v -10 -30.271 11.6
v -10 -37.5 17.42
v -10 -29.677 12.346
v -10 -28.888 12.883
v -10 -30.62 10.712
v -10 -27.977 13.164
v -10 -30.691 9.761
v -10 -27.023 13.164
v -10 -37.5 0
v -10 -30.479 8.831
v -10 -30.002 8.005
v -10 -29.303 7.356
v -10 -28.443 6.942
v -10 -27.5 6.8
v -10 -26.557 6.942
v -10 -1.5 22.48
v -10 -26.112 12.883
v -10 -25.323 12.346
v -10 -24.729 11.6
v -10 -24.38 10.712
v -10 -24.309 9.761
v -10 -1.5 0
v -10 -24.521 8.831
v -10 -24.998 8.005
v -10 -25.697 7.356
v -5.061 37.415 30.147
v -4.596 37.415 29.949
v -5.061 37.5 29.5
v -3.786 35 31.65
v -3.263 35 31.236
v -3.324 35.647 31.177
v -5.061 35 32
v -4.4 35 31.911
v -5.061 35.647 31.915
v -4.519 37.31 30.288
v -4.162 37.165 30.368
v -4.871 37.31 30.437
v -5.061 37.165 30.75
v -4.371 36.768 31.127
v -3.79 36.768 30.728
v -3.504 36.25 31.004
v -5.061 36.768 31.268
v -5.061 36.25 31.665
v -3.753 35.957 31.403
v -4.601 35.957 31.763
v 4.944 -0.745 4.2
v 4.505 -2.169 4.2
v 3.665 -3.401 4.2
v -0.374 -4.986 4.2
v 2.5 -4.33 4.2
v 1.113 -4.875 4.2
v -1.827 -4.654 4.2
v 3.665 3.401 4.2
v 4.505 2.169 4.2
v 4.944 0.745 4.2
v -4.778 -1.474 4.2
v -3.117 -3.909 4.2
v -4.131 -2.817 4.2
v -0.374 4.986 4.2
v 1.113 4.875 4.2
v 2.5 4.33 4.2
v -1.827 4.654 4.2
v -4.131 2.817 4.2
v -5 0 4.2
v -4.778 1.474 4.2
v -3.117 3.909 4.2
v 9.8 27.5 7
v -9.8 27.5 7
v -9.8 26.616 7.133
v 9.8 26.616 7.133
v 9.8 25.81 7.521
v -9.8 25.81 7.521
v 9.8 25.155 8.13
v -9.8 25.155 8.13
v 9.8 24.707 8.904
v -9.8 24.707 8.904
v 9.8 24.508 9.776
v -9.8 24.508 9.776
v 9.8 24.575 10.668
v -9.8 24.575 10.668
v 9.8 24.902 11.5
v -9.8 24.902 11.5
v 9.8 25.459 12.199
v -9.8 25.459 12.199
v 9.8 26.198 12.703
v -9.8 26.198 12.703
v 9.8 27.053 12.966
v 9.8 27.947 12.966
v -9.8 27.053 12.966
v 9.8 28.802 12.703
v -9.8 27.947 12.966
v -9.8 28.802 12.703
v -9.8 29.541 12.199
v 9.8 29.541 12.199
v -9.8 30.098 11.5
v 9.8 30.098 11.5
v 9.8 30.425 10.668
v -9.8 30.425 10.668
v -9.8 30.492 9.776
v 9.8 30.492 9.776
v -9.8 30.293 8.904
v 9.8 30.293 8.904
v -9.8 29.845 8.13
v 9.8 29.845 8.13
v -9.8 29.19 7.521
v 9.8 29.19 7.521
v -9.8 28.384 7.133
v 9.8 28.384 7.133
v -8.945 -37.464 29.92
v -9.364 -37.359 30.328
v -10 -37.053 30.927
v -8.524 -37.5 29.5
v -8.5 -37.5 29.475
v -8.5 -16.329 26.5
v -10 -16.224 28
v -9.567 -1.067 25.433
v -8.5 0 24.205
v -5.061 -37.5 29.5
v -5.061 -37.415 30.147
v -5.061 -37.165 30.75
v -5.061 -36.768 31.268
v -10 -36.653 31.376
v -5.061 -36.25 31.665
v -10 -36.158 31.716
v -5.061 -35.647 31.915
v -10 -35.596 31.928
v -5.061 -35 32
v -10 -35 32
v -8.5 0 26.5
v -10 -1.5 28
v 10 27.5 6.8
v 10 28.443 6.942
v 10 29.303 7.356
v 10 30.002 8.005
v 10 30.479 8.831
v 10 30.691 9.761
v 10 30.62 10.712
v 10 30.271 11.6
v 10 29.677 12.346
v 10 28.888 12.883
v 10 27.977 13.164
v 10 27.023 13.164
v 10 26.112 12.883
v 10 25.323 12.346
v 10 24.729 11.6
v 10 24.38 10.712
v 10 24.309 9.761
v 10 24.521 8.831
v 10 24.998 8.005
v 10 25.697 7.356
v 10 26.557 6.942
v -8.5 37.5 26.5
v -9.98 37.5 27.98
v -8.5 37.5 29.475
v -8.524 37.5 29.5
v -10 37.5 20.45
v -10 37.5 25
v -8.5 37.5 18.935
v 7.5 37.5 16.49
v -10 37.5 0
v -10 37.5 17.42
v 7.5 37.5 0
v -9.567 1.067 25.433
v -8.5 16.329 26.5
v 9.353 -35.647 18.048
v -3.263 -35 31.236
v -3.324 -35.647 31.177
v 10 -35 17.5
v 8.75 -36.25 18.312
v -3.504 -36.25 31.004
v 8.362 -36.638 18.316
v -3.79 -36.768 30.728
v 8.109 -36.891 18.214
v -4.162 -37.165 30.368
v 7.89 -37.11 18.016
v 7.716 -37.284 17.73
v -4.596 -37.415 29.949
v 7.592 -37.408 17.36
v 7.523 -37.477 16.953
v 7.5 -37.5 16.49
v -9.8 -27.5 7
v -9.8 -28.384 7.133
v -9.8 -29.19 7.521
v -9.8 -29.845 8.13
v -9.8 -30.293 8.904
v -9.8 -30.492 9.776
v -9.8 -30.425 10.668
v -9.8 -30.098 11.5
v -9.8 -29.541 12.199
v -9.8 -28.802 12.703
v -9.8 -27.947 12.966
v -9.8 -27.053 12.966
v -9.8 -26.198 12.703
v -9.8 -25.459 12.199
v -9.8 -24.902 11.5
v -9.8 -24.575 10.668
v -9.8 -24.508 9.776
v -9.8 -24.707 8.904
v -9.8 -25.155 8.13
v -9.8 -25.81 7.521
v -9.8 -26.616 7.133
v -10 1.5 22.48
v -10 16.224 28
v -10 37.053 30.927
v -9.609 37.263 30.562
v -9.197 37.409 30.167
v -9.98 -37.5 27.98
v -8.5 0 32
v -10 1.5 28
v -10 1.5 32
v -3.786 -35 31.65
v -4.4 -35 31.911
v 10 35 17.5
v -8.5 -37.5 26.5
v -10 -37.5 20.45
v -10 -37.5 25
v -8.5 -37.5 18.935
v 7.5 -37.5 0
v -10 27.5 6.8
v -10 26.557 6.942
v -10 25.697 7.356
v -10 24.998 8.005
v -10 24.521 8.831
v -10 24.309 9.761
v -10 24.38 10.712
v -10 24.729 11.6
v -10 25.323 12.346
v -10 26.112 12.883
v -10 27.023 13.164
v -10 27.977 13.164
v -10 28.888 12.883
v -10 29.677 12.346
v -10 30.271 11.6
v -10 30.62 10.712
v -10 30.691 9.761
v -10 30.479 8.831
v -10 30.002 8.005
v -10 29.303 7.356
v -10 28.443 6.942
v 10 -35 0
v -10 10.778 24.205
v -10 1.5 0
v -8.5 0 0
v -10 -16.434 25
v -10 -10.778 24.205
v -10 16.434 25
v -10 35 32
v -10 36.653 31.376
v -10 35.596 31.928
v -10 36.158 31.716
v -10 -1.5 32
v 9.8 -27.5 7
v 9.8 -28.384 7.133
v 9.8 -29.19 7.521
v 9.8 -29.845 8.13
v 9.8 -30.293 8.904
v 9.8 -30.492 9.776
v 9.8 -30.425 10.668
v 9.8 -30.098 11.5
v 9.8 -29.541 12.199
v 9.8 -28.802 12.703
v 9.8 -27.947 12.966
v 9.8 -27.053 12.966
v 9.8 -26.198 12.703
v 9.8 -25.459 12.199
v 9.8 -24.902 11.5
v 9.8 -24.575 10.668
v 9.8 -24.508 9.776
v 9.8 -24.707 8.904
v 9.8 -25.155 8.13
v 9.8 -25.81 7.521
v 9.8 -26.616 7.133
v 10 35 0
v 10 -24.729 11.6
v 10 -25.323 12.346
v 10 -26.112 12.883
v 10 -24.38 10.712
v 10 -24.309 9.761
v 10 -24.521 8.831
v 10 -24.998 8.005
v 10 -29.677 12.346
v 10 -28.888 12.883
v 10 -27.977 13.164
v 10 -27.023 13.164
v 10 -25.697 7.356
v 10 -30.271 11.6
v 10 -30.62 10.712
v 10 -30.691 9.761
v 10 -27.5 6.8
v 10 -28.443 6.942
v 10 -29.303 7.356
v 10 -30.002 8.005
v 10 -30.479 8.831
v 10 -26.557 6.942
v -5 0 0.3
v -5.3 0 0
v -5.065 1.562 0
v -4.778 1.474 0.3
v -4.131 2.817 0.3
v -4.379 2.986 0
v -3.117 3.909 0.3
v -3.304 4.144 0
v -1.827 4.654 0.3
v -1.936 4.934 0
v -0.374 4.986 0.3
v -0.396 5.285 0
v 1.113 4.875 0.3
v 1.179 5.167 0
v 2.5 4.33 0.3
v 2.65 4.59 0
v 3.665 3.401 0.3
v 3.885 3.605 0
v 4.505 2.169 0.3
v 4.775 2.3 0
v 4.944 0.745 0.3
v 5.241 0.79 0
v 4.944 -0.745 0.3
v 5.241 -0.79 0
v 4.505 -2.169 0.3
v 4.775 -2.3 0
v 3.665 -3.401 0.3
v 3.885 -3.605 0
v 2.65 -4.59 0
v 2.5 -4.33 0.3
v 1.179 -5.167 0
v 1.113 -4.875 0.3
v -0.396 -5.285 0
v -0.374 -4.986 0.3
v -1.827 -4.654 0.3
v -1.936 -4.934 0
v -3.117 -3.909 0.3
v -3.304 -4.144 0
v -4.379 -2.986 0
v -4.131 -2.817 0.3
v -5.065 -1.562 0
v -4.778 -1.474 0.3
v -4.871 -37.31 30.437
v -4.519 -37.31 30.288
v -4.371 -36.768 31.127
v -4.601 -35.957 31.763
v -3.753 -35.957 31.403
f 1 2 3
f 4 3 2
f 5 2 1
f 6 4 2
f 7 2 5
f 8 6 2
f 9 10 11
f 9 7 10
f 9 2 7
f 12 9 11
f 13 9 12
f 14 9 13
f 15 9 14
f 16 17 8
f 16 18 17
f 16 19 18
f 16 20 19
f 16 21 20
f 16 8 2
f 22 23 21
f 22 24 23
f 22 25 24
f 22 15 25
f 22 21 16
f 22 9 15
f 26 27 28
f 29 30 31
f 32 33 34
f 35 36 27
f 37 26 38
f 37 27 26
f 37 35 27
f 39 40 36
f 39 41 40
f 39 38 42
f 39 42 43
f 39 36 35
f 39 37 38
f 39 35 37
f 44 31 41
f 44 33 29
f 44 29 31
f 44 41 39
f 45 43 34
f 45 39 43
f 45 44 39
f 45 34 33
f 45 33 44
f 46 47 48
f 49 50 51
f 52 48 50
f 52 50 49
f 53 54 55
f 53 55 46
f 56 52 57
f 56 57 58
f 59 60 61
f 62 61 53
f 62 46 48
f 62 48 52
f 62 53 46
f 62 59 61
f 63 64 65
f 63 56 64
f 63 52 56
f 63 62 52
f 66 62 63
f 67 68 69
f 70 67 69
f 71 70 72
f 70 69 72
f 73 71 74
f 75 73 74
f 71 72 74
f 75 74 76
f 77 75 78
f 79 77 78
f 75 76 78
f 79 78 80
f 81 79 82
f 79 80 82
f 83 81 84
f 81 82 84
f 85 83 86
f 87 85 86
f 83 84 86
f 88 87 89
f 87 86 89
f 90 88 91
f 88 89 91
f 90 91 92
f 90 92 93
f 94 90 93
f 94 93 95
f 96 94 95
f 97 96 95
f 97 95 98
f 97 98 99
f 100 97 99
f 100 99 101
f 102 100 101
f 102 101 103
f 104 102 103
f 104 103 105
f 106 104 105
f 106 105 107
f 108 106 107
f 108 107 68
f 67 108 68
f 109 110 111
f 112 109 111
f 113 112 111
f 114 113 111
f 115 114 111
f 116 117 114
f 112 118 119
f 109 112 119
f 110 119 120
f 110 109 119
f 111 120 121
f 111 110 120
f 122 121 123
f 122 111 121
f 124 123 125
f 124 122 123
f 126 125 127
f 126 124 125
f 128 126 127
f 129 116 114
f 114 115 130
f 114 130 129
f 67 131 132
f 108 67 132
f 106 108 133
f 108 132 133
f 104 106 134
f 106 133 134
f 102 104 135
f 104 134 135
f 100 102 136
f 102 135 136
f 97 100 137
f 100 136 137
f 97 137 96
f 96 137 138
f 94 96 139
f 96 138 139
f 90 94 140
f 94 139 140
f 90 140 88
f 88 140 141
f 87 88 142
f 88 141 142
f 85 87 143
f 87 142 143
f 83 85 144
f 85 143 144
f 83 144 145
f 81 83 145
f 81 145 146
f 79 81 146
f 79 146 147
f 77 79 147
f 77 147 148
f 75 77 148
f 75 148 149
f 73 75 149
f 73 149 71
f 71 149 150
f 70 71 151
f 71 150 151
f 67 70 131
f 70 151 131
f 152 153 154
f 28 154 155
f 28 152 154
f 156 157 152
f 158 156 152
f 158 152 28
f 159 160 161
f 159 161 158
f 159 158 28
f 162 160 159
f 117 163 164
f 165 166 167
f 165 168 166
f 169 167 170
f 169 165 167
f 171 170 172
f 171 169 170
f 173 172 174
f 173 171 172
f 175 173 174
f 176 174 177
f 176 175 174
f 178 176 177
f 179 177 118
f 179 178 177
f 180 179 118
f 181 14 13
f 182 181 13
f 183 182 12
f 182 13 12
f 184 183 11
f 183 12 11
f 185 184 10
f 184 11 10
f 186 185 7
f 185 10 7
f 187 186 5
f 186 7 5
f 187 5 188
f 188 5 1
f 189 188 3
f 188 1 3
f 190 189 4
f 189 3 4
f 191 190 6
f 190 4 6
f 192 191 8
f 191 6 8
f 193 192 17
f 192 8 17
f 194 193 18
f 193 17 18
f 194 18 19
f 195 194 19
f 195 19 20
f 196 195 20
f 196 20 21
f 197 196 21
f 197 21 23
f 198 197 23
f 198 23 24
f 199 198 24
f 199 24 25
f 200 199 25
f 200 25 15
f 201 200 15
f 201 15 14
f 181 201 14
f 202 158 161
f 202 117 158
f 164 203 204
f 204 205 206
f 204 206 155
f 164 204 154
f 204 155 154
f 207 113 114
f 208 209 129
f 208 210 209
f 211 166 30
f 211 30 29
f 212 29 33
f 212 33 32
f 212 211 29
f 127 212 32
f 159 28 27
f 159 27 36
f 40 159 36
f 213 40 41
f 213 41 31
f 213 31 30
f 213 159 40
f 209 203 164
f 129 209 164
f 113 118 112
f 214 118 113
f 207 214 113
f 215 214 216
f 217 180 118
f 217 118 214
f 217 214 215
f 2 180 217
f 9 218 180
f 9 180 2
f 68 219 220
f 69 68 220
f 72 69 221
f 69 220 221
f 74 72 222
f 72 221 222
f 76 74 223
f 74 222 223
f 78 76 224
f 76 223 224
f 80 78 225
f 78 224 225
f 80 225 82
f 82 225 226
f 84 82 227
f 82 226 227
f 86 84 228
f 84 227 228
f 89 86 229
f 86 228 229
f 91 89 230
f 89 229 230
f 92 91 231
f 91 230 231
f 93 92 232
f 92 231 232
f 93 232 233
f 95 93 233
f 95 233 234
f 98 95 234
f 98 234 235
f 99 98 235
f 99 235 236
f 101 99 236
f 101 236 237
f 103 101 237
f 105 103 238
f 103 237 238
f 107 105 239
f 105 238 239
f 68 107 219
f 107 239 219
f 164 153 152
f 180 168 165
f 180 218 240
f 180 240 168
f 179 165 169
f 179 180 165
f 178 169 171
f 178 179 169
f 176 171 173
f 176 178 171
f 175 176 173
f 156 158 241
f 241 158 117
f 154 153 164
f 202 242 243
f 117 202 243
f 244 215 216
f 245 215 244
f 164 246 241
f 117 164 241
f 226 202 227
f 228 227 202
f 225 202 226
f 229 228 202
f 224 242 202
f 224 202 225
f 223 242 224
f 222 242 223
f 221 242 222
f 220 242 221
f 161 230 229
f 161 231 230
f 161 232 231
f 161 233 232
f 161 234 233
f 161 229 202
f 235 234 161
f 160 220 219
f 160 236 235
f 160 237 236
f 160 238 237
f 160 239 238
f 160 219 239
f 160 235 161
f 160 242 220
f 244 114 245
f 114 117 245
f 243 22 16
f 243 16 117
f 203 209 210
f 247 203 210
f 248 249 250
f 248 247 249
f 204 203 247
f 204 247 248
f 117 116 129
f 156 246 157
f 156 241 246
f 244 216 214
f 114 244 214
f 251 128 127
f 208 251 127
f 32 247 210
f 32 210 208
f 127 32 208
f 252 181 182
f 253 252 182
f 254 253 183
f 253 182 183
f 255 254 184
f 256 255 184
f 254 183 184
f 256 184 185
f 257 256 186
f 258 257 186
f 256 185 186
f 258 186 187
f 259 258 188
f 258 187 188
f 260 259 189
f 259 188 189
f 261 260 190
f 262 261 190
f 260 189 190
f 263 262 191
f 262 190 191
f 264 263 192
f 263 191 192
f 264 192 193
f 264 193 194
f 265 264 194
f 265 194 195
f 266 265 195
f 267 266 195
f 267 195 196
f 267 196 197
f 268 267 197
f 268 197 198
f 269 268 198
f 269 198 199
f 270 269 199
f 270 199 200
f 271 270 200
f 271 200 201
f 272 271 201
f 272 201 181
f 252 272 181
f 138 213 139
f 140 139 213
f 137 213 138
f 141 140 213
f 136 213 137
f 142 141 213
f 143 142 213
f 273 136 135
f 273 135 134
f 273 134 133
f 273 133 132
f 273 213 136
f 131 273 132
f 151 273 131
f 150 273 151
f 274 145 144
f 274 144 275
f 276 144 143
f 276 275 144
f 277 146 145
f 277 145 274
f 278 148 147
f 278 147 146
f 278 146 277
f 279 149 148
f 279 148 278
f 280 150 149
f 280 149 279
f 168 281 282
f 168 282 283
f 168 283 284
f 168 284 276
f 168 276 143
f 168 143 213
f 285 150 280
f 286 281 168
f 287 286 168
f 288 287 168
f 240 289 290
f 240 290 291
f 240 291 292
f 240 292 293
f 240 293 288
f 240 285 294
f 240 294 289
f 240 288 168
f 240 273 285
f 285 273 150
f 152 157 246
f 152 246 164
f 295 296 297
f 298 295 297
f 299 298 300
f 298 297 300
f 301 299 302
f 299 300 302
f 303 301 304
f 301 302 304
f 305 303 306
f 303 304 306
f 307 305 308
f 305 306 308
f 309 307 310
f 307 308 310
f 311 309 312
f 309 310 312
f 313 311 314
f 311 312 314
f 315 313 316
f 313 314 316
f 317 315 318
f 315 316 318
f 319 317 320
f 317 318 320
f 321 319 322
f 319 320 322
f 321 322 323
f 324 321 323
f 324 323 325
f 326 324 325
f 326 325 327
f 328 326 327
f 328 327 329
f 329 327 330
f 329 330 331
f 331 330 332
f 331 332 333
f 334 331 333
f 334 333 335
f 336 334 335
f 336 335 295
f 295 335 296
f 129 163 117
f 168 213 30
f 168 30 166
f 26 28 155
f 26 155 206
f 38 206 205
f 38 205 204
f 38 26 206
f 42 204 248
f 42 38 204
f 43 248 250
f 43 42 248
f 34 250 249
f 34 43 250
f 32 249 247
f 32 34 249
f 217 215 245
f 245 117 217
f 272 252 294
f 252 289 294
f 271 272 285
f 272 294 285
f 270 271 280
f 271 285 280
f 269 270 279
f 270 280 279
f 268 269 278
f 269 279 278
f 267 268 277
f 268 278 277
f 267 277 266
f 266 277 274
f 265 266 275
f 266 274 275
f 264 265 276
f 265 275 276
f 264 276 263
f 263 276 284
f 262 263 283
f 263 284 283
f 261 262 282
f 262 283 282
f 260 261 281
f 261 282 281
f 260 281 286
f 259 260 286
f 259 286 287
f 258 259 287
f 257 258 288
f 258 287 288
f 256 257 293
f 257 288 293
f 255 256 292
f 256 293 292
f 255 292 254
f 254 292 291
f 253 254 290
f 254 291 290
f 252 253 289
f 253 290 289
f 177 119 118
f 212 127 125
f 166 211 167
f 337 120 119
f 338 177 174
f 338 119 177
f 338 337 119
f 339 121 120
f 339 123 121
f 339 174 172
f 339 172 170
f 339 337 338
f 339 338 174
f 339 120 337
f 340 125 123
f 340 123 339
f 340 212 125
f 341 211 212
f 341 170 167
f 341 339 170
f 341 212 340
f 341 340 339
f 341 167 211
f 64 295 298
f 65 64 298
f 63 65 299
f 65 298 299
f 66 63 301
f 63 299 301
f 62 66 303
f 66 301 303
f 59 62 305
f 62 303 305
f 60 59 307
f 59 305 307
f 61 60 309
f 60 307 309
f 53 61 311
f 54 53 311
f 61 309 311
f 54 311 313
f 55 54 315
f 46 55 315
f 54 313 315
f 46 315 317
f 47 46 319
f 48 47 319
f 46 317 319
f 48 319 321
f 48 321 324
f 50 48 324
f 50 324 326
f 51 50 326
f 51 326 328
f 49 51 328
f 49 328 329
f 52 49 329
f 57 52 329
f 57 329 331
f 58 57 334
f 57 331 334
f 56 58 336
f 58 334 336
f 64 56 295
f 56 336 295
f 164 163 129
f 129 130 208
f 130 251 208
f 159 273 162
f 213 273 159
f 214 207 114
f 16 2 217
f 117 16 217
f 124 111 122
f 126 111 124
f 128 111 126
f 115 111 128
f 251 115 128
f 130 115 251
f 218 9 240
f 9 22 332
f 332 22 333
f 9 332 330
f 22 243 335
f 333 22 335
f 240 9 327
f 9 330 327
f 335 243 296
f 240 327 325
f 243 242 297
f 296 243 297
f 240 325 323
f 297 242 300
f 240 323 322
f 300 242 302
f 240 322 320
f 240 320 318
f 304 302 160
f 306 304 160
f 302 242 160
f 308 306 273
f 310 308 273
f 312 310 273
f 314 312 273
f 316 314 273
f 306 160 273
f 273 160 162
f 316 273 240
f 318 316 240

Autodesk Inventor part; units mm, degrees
ref_plane "YZ Plane" through (0, 0, 0) normal (1, 0, 0) x (0, 1, 0)
ref_plane "XZ Plane" through (0, 0, 0) normal (0, 1, 0) x (-1, 0, 0)
sketch "Szkic1" plane through (0, 0, 0) normal (0, 0, 1) x (1, 0, 0)
  line L0 (-10, 37.5) -> (10, 37.5)
  line L1 (10, 37.5) -> (10, -37.5)
  line L2 (10, -37.5) -> (-10, -37.5)
  line L3 (-10, -37.5) -> (-10, 37.5)
  point P0 (0, 0)
  dimension "d0" = 20
  dimension "d1" = 75
  dimension "d39" = 37.5
  dimension "d40" = 10
extrude "Wyciągnięcie proste1" add sketch "Szkic1" along normal blind 32
sketch "Szkic2" plane through (10, -37.5, 0) normal (1, 0, 0) x (0, 0, -1)
  line L0 (0, 75) -> (0, 0) projected
  line L1 (0, 75) -> (-32, 75) projected
  line L2 (-32, 0) -> (-32, 75) projected
  line L3 (0, 0) -> (-32, 0) projected
  point P0 (0, 37.5)
  point P1 (-10, 10)
  point P2 (-10, 65)
  dimension "d4" = 32
  dimension "d5" = 10
  dimension "d6" = 10
  dimension "d7" = 10
  dimension "d8" = 10
hole "Otwór1" at (10, -27.5, 10) at (10, 27.5, 10) direction (-1, 0, 0) diameter 6 end through all
sketch "Szkic3" plane through (-10, 37.5, 0) normal (0, 1, 0) x (1, 0, 0)
  line L0 (0, 0) -> (20, 0) projected
  line L1 (0, 0) -> (0, -32) projected
  line L2 (20, -32) -> (0, -32) projected
  line L3 (20, 0) -> (20, -32) projected
  line L4 (0, -28) -> (1.5, -26.5)
  line L5 (0, -28) -> (2.2095, -28) construction
  line L6 (0, 0) -> (0, -32) projected
  line L7 (0, -25) -> (1.5, -26.5)
  line L8 (0, -25) -> (2.7592, -25) construction
  dimension "d17" = 45
  dimension "d19" = 45
  dimension "d20" = 3
  dimension "d21" = 4
extrude "Wyciągnięcie proste2" cut sketch "Szkic3" against normal through all contours L7 L4 L1
chamfer "Faza1" distance 14 distance2 14.5 1 edges at (10, 0, 32) measured on face at (-3.3333, 12.5, 32)
chamfer "Faza2" distance 2.5 angle 45 2 edges at (10, -37.5, 8.75) (10, 37.5, 8.75)
ref_plane "Płaszczyzna konstrukcyjna1" through (-10, 37.5, 32) normal (0, -0.9902681, -0.1391731) x (-1, 0, 0)
sketch "Szkic4" plane through (-10, 37.5, 32) normal (0, -0.9902681, -0.1391731) x (-1, 0, 0)
  line L0 (-17.5, 31.6886) -> (-17.5, 11.7948) projected
  line L1 (0, 31.6886) -> (-17.5, 31.6886) projected
  line L2 (0, 31.6886) -> (0, 6.9319) projected
  line L3 (0, 6.9319) -> (-1.5, 5.4465) projected
  line L4 (-1.5, 5.4465) -> (0, 3.9611) projected
  line L5 (0, 3.9611) -> (0, 0) projected
  line L6 (-6, 0) -> (0, 0) projected
  line L7 (-17.5, 11.7948) -> (-6, 0) projected
  line L8 (0, -3.5061) -> (0, 6.9319) projected
  line L9 (0, 1) -> (-1.5, 2.5)
  line L10 (0, 1) -> (2.5951, 1) construction
  line L11 (0, 31.6886) -> (0, 6.9319) projected
  line L12 (0, 4) -> (-1.5, 2.5)
  line L13 (0, 4) -> (3.5979, 4) construction
  line L14 (0, 1) -> (0, 4)
  point P0 (-10, 26.4696)
  dimension "d32" = 135
  dimension "d34" = 135
  dimension "d35" = 3
  dimension "d36" = 1
extrude "Wyciągnięcie proste3" cut sketch "Szkic4" along normal through all contours L8 L4 L12 | L9 L12 L4 L5
mirror "Odbicie lustrzane1" about plane through (0, 0, 0) normal (0, 1, 0) of "Wyciągnięcie proste3"
sketch "Szkic5" plane through (0, 0, 32) normal (0, 0, 1) x (1, 0, 0)
  line L0 (-4, 37.5) -> (-4, -37.5) projected
  line L1 (-4, 37.5) -> (-10, 37.5) projected
  line L2 (-10, 37.5) -> (-10, -37.5) projected
  line L3 (-10, -37.5) -> (-4, -37.5) projected
  line L4 (-10, 1.5) -> (-4.369, 1.5) construction
  line L5 (-10, -37.5) -> (-10, 0) projected
  line L6 (-10, -1.5) -> (-2.768, -1.5) construction
  line L7 (-10, -1.5) -> (-8.5, 0)
  line L8 (-10, 1.5) -> (-8.5, 0)
  point P0 (0, 0)
  dimension "d45" = 3
  dimension "d46" = 45
  dimension "d47" = 45
  dimension "d48" = 75
  dimension "d49" = 36
extrude "Wyciągnięcie proste4" cut sketch "Szkic5" against normal through all contours L8 L7 L2
fillet "Zaokrąglenie1" radius 2.5 5 edges at (-4, 0, 32) (1.75, 37.5, 26.0446) (1.75, -37.5, 26.0446) (-7, -37.5, 32) (-7, 37.5, 32)
chamfer "Faza3" distance 0.2 angle 45 4 edges at (-10, 27.5, 13) (-10, -27.5, 13) (10, -27.5, 13) (10, 27.5, 13)
sketch "Szkic6" plane through (0, 0, 0) normal (0, 0, -1) x (-1, 0, 0)
  circle A0 centre (0, 0) radius 5
  line L0 (10, -1.5) -> (8.5, 0) projected
  line L1 (8.5, 0) -> (10, 1.5) projected
  line L2 (10, 1.5) -> (10, 37.5) projected
  line L3 (10, 37.5) -> (-7.5, 37.5) projected
  line L4 (-10, 35) -> (-7.5, 37.5) projected
  line L5 (-10, 35) -> (-10, -35) projected
  line L6 (-7.5, -37.5) -> (-10, -35) projected
  line L7 (-7.5, -37.5) -> (10, -37.5) projected
  line L8 (10, -37.5) -> (10, -1.5) projected
  point P0 (0, 0)
  dimension "d56" = 10
  dimension "d57" = 75
  dimension "d58" = 37.5
  dimension "d59" = 20
  dimension "d60" = 10
extrude "Wyciągnięcie proste5" cut sketch "Szkic6" against normal blind 4.2 contours A0
chamfer "Faza4" distance 0.3 angle 45 1 edges at (5, 0, 0)
equation "\"d39\" = 0.5 * d1"
equation "\"d40\" = 0.5 * d0"
equation "\"d6\" = d5"
equation "\"d8\" = d7"
equation "\"d49\" = -0.5 * d45 + 0.5 * d48"
equation "\"d58\" = 0.5 * d57"
equation "\"d60\" = 0.5 * d59"
properties part number "3DP_ABS_Jaw_Second_Half"
